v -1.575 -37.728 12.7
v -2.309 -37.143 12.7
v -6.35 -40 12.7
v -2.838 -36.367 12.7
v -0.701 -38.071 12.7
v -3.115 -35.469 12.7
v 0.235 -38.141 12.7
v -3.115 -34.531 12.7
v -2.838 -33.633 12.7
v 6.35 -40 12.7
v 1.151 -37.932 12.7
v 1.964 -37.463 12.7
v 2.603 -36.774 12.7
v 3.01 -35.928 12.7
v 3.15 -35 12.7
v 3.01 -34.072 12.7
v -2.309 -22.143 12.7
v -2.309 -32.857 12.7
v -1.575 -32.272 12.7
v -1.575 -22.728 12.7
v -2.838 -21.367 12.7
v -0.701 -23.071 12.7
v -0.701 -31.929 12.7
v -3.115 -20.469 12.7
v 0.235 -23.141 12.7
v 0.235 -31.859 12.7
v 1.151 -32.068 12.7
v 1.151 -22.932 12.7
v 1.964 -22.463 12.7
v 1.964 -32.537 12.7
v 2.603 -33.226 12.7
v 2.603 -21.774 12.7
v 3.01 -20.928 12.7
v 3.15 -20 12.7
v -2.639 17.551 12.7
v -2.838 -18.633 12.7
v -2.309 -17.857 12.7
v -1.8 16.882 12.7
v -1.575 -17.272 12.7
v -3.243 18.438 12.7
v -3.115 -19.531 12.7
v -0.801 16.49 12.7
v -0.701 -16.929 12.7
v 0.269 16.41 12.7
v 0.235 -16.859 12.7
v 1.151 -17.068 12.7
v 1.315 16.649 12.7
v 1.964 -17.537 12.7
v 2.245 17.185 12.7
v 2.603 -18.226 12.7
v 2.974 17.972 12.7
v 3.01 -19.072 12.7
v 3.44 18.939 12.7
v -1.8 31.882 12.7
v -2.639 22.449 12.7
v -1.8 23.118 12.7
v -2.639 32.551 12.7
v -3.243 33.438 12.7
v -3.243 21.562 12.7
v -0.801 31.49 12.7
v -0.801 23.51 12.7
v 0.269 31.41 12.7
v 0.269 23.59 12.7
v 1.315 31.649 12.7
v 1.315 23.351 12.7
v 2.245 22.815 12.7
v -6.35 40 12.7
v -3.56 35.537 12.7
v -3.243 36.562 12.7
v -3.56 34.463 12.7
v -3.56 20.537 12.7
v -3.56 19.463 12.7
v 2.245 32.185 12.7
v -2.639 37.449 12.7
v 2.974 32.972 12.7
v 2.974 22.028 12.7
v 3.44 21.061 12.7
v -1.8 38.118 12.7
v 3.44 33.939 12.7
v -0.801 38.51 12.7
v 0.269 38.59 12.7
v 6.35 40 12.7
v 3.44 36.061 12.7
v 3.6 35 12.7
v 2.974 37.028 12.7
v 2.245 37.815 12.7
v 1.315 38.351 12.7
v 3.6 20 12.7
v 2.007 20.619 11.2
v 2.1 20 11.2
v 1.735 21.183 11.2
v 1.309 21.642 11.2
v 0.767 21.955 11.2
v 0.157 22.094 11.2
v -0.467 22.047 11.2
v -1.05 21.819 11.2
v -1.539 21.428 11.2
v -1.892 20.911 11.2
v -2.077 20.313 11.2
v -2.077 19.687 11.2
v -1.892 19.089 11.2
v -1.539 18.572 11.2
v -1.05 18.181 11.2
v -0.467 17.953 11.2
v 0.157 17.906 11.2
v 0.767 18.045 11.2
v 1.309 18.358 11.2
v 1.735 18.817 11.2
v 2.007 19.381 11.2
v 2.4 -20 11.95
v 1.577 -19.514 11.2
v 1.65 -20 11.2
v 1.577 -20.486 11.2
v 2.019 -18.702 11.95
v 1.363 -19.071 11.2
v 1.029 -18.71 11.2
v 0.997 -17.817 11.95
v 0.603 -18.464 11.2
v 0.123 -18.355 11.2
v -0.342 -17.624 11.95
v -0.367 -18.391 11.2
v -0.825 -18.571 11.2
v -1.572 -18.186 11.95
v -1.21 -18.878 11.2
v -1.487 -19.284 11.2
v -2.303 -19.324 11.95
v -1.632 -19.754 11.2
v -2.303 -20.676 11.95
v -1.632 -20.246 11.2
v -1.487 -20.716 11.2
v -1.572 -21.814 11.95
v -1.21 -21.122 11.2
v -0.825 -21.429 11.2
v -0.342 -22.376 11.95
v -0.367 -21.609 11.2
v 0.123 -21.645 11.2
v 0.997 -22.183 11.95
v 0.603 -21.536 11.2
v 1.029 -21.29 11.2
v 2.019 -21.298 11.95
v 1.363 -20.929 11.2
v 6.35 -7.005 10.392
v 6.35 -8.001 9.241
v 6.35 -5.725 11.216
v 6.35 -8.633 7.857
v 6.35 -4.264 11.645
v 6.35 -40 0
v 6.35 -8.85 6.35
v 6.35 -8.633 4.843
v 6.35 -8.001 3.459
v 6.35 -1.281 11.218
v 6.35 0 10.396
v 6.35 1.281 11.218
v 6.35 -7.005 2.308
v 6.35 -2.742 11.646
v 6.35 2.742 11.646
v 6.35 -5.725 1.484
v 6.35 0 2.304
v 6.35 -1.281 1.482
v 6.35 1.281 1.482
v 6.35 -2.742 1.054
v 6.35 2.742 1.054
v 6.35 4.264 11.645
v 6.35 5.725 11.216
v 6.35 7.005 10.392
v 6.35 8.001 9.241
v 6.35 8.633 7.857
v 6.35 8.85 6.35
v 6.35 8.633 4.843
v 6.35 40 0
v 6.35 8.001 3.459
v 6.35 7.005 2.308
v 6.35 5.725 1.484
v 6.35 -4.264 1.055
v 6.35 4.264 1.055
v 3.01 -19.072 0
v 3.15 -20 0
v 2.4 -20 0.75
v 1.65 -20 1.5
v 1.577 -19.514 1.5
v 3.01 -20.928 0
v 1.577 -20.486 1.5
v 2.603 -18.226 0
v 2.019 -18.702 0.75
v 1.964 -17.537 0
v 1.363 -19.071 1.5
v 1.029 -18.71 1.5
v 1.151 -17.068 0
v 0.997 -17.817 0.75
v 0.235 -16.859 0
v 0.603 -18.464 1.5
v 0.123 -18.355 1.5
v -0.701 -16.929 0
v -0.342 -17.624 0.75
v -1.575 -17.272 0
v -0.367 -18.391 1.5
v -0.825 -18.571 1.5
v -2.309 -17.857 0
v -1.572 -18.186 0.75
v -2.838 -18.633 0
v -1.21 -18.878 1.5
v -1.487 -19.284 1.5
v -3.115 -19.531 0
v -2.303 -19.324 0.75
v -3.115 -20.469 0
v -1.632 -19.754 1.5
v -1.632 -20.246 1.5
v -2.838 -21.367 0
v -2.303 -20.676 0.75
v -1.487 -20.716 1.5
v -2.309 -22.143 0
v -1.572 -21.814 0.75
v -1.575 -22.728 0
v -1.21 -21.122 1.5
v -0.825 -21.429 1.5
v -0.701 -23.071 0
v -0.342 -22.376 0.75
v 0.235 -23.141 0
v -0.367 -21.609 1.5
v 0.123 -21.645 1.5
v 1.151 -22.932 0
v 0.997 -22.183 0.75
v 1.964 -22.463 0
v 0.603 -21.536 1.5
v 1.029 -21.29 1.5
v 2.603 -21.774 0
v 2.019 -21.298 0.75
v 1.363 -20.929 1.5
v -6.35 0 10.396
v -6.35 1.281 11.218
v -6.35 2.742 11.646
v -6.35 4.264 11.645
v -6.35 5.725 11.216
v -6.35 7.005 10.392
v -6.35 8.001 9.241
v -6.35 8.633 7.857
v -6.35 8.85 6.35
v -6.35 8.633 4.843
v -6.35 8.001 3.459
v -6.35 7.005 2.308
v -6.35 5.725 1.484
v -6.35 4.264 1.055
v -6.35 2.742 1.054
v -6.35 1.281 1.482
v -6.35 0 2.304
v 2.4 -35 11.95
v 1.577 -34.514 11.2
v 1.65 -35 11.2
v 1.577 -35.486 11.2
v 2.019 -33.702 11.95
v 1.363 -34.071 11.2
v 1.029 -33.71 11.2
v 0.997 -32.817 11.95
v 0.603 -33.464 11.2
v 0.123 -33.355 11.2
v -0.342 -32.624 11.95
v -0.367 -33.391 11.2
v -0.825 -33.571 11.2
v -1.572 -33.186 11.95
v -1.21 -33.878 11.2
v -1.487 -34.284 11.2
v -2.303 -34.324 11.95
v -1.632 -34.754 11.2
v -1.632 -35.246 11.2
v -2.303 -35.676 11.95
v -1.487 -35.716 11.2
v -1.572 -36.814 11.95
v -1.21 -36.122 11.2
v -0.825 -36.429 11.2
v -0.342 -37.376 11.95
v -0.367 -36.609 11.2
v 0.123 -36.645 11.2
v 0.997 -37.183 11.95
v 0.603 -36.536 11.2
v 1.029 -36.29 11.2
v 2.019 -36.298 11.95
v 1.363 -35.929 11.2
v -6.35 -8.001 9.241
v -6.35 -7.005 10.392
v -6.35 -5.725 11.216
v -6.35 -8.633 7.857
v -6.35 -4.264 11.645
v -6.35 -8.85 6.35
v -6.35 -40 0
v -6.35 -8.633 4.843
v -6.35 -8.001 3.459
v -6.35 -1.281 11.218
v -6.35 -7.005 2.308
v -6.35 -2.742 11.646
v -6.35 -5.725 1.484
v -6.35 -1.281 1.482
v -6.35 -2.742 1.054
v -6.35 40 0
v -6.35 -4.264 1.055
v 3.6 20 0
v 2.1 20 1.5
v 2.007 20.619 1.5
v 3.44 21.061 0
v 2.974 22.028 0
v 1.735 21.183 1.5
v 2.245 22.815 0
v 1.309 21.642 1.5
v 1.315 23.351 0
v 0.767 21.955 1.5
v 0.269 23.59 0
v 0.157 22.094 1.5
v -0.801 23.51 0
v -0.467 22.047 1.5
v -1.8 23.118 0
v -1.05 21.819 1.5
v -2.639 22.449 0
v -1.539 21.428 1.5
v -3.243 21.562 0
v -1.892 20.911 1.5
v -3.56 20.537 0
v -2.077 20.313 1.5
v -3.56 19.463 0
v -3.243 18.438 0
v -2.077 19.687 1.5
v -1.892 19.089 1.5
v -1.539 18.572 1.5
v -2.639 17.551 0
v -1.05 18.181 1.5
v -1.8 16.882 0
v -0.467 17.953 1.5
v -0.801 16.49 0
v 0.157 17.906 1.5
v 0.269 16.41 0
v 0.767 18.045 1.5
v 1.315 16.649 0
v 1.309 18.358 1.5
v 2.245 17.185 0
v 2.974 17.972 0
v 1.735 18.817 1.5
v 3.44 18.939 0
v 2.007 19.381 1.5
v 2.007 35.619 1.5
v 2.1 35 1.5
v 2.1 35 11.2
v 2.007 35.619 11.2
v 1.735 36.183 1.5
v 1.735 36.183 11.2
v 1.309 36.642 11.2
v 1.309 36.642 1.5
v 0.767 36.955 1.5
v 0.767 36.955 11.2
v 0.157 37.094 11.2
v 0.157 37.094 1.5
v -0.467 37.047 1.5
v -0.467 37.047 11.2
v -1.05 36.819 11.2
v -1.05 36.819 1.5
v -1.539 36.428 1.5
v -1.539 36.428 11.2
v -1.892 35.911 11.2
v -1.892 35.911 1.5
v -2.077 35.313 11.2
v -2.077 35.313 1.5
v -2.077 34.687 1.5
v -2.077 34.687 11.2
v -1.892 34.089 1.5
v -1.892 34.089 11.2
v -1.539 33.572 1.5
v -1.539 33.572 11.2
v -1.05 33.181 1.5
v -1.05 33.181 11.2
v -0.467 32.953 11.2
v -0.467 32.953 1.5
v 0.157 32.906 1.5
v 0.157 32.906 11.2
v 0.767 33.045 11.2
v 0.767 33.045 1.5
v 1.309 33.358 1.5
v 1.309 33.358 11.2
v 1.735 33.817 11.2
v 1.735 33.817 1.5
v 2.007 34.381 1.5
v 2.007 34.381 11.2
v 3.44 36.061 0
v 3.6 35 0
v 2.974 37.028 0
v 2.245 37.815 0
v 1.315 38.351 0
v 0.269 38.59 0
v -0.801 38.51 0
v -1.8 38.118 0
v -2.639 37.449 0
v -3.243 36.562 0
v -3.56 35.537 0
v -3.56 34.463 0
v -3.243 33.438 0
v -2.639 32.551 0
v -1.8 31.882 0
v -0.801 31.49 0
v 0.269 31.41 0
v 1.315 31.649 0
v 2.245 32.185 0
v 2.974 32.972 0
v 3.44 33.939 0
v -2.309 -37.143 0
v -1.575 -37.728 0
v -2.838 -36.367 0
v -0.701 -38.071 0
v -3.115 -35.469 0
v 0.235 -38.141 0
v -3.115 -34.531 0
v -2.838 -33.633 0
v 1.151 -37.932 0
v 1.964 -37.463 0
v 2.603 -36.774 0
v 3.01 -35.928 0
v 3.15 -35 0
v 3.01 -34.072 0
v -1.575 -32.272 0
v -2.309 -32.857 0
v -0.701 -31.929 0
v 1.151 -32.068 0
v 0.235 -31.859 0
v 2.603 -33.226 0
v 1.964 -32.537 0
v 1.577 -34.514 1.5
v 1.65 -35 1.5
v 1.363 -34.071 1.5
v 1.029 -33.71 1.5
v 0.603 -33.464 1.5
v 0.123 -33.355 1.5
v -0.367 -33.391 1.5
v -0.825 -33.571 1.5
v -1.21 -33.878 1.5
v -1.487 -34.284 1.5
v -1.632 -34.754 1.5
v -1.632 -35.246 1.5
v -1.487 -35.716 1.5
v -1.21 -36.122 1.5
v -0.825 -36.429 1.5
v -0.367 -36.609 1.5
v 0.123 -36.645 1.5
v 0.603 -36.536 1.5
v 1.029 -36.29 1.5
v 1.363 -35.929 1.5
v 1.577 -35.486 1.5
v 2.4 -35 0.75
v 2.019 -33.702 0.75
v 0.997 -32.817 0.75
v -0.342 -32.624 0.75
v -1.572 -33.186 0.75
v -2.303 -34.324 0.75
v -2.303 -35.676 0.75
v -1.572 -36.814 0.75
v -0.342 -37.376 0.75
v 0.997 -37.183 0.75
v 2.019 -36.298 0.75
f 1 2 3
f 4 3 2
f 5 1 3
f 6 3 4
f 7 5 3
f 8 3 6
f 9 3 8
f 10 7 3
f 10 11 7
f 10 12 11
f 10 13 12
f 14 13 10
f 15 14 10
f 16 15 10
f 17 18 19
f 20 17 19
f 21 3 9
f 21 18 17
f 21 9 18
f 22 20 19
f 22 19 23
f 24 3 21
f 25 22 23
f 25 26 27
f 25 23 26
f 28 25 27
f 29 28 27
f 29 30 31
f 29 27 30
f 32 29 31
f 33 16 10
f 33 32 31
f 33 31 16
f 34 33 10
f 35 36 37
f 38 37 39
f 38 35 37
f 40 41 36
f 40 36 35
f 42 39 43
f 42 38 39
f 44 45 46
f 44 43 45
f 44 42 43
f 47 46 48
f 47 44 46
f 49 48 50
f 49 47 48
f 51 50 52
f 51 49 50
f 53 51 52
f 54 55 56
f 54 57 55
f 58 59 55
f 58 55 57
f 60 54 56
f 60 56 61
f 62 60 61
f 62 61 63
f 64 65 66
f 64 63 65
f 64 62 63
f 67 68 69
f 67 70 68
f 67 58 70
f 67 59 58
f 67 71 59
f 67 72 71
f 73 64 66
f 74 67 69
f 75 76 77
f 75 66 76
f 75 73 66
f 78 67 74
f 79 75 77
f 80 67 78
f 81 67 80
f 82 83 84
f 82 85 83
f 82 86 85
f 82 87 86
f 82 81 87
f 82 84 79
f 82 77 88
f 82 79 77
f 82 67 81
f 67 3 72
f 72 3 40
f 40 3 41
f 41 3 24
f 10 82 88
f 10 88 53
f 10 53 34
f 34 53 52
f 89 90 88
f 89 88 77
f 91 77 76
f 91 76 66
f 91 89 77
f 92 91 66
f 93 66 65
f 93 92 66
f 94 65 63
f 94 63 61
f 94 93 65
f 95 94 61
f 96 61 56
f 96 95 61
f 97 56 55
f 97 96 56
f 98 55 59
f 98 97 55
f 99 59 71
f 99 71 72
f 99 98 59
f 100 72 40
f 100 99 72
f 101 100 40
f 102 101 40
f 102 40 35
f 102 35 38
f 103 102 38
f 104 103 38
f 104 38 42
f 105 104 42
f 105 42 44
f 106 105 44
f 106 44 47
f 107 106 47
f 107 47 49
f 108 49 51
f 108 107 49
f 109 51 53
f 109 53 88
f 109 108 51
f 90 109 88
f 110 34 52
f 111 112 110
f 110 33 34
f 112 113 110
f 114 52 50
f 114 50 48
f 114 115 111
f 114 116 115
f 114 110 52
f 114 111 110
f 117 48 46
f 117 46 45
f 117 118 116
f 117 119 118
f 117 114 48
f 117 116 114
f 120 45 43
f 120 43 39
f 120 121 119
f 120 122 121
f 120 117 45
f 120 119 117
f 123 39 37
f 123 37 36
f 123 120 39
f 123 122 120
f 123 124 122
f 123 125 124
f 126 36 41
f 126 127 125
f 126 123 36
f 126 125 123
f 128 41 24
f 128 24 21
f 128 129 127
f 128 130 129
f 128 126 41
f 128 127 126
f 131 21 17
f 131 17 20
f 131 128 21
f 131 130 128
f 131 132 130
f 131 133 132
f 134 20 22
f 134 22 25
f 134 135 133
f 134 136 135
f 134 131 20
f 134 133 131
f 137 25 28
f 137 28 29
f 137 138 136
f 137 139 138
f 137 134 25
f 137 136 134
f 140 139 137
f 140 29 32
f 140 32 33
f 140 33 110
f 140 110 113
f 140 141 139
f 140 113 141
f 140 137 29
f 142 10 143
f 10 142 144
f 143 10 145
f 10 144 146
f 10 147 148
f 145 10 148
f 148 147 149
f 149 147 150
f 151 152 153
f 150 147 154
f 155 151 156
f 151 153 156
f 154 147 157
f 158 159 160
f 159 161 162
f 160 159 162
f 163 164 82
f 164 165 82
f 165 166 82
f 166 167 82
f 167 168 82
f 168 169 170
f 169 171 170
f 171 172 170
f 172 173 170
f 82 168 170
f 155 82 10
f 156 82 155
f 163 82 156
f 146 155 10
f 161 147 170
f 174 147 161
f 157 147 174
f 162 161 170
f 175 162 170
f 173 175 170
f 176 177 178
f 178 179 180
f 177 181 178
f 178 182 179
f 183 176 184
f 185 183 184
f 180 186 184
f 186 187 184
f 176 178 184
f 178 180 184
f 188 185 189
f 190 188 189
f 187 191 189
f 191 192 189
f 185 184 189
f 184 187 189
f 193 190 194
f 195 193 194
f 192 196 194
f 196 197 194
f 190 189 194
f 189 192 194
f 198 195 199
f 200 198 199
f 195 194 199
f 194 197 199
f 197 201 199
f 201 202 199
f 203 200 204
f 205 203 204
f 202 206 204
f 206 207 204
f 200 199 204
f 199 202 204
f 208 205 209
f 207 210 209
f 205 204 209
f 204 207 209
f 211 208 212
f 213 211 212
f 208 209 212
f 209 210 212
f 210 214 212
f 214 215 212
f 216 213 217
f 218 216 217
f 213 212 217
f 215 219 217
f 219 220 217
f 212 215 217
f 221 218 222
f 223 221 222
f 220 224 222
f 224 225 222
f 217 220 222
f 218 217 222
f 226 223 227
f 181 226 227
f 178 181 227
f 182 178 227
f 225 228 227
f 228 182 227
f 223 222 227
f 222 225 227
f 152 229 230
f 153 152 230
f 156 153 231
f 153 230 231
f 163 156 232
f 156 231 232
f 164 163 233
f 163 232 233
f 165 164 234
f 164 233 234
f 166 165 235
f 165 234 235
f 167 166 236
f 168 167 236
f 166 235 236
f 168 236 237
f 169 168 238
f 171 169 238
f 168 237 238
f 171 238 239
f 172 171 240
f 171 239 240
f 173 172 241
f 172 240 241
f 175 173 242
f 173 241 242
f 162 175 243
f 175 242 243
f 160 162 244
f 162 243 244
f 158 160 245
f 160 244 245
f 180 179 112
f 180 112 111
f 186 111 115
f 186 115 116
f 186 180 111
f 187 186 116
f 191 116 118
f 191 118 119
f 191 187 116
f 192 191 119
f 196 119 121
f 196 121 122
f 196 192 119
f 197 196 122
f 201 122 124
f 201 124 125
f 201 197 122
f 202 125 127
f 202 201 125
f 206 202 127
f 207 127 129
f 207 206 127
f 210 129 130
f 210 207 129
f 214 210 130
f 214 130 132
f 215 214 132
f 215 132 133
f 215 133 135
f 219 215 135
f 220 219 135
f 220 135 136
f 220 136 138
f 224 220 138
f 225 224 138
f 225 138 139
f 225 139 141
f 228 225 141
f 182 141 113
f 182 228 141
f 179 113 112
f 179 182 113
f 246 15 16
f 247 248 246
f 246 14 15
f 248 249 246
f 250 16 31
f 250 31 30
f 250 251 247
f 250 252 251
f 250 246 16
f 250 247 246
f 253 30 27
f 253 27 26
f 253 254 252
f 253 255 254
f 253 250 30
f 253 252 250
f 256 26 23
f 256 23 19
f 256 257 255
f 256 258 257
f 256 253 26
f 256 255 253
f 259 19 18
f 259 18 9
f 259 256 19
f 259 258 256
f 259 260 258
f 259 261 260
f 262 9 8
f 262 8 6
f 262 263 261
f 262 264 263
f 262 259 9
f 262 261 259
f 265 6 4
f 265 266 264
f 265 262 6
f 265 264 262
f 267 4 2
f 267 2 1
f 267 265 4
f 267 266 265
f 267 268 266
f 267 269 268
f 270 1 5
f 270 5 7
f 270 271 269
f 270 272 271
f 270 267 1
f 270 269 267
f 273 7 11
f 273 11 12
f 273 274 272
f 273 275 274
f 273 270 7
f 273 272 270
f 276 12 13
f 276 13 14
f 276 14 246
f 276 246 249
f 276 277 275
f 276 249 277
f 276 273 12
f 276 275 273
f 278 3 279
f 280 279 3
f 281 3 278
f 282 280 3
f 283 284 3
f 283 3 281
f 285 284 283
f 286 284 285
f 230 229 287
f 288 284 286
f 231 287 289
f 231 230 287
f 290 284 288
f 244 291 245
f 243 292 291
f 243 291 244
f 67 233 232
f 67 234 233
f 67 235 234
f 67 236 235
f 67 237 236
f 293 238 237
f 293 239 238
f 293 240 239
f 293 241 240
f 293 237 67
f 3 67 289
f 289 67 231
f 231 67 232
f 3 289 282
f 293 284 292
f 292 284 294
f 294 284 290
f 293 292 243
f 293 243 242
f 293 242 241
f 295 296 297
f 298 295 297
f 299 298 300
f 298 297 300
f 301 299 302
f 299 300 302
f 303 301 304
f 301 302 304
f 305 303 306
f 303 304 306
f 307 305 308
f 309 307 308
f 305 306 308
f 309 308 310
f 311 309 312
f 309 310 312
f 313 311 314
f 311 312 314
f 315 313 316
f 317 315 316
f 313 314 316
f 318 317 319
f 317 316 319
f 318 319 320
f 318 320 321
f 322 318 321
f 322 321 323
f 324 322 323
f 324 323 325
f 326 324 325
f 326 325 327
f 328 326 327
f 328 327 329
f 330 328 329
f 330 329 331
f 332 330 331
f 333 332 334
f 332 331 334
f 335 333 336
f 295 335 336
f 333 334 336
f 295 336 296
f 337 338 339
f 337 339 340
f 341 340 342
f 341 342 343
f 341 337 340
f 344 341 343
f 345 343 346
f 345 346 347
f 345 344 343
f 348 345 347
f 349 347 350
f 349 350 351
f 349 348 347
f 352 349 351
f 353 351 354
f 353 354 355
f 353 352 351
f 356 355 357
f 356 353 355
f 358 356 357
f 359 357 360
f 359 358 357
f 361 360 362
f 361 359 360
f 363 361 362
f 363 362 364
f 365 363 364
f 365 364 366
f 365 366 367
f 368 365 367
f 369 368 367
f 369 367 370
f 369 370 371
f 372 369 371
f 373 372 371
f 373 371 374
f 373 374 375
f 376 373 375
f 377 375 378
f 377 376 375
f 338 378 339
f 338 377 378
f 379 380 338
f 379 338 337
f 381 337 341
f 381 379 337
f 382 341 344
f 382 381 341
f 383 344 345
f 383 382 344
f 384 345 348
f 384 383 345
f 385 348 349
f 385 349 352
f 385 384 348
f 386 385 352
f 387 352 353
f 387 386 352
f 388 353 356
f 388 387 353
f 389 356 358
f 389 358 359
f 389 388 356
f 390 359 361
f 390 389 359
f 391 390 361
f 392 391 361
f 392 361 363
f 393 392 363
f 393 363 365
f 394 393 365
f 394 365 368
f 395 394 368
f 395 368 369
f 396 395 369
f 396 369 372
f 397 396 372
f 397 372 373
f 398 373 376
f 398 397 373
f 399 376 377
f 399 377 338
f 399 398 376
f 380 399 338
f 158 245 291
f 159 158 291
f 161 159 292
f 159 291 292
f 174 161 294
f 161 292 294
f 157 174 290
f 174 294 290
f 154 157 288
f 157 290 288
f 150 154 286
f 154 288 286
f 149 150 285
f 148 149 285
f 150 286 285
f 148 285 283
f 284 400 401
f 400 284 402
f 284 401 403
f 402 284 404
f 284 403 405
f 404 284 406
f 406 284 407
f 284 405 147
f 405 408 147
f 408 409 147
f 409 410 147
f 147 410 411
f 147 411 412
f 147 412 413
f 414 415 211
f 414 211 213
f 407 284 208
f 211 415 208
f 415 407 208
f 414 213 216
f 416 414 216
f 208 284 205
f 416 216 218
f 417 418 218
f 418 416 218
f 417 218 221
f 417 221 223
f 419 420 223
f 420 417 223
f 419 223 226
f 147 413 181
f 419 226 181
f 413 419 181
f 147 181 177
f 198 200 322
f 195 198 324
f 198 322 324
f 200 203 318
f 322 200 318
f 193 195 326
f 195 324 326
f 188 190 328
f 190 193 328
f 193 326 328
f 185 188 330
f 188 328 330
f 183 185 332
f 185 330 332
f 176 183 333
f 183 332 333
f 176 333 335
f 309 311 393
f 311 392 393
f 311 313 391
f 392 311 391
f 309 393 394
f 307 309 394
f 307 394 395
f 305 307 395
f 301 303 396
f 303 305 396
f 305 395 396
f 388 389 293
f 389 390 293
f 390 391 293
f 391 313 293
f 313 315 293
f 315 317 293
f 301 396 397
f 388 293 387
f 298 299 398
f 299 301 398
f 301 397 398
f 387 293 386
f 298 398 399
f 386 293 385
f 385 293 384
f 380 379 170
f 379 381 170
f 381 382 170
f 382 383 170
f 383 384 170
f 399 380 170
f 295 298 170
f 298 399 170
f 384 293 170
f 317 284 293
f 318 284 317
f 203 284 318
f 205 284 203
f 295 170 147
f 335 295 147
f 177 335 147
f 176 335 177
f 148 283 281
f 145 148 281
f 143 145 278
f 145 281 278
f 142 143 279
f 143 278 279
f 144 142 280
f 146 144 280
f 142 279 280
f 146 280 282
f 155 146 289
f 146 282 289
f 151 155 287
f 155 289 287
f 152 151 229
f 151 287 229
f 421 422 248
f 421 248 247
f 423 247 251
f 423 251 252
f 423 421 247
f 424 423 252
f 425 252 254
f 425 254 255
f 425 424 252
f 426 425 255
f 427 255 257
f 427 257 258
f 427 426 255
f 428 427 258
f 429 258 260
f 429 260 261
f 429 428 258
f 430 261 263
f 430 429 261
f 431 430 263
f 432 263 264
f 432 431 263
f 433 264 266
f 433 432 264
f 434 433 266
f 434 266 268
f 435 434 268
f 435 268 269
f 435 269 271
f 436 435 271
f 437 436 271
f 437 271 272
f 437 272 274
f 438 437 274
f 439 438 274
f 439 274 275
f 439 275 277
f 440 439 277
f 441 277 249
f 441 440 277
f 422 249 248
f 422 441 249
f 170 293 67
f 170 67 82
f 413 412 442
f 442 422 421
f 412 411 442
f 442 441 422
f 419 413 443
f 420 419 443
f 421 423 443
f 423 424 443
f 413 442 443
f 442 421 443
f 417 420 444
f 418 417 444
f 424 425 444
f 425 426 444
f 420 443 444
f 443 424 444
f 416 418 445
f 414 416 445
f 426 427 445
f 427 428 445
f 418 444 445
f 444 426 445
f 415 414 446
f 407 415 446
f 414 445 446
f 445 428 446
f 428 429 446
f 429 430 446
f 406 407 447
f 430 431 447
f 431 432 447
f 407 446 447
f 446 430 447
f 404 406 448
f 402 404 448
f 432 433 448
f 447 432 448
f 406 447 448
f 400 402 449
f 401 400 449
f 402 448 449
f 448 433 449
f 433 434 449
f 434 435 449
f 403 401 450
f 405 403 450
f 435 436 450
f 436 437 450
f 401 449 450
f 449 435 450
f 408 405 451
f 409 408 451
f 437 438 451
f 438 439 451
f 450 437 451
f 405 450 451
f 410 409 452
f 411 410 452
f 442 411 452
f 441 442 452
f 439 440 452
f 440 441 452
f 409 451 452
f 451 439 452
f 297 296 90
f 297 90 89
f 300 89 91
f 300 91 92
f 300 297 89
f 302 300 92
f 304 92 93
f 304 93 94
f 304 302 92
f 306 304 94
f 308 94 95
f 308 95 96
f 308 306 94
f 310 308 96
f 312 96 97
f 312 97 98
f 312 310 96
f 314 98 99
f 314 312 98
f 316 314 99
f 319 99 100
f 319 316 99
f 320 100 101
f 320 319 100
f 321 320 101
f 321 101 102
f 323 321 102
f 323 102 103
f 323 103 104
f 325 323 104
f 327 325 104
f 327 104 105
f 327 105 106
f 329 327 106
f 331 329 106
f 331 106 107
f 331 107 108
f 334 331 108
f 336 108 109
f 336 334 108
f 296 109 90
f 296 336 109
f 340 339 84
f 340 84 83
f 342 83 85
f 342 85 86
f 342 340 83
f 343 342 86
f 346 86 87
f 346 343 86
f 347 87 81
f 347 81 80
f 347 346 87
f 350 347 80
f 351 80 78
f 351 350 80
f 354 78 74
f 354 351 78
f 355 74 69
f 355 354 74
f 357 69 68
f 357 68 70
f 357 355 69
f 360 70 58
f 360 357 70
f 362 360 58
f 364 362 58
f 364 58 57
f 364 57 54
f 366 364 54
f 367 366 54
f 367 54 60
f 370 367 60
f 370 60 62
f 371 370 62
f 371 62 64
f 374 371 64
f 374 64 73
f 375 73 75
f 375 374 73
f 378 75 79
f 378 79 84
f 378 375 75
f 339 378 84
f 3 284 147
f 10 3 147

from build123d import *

# Parameters (mm, degrees)
F0_W     = 12.7
F0_H     = 80
F0_R     = 1.65
F0_R_2   = 2.1
F1_DEPTH = 12.7
F3_DEPTH = 12.701
F4_SIZE  = 1.5
F5_SIZE  = 1.5


with BuildPart() as f1:
    # F0 (on Top) → F1 (new body)
    with BuildSketch(Plane.XY):
        Rectangle(F0_W, F0_H)
        with Locations((0, -35)):
            Circle(F0_R, mode=Mode.SUBTRACT)
        with Locations((0, -20)):
            Circle(F0_R, mode=Mode.SUBTRACT)
        with Locations((0, 20)):
            Circle(F0_R_2, mode=Mode.SUBTRACT)
        with Locations((0, 35)):
            Circle(F0_R_2, mode=Mode.SUBTRACT)
    extrude(amount=F1_DEPTH)

    # F2 (on face) → F3 (cut, through all)
    with BuildSketch(Plane(origin=(-6.35, 0, 0), x_dir=(0, -1, 0), z_dir=(-1, 0, 0))):
        with BuildLine():
            ThreePointArc((0, 2.303705), (-1.85, 6.35), (0, 10.396295))
            ThreePointArc((0, 10.396295), (-8.85, 6.35), (0, 2.303705))
        make_face()
        with BuildLine():
            ThreePointArc((0, 10.396295), (1.365568, 8.574579), (1.85, 6.35))
            ThreePointArc((1.85, 6.35), (1.365568, 4.125421), (0, 2.303705))
            ThreePointArc((0, 2.303705), (5.724579, 1.484432), (8.85, 6.35))
            ThreePointArc((8.85, 6.35), (5.724579, 11.215568), (0, 10.396295))
        make_face()
        with BuildLine():
            ThreePointArc((0, 2.303705), (1.365568, 4.125421), (1.85, 6.35))
            ThreePointArc((1.85, 6.35), (1.365568, 8.574579), (0, 10.396295))
            ThreePointArc((0, 10.396295), (-1.85, 6.35), (0, 2.303705))
        make_face()
    extrude(amount=-F3_DEPTH, mode=Mode.SUBTRACT)

    # F4
    f4_edges = [f1.edges().sort_by_distance(p)[0] for p in [
        (-2.1, 35, 12.7),
        (-2.1, 20, 12.7),
        (-1.65, -20, 12.7),
        (-1.65, -35, 12.7),
    ]]
    chamfer(f4_edges, length=F4_SIZE)

    # F5
    f5_edges = [f1.edges().sort_by_distance(p)[0] for p in [
        (-2.1, 35, 0),
        (-2.1, 20, 0),
        (-1.65, -20, 0),
        (-1.65, -35, 0),
    ]]
    chamfer(f5_edges, length=F5_SIZE)


solid = f1.part
